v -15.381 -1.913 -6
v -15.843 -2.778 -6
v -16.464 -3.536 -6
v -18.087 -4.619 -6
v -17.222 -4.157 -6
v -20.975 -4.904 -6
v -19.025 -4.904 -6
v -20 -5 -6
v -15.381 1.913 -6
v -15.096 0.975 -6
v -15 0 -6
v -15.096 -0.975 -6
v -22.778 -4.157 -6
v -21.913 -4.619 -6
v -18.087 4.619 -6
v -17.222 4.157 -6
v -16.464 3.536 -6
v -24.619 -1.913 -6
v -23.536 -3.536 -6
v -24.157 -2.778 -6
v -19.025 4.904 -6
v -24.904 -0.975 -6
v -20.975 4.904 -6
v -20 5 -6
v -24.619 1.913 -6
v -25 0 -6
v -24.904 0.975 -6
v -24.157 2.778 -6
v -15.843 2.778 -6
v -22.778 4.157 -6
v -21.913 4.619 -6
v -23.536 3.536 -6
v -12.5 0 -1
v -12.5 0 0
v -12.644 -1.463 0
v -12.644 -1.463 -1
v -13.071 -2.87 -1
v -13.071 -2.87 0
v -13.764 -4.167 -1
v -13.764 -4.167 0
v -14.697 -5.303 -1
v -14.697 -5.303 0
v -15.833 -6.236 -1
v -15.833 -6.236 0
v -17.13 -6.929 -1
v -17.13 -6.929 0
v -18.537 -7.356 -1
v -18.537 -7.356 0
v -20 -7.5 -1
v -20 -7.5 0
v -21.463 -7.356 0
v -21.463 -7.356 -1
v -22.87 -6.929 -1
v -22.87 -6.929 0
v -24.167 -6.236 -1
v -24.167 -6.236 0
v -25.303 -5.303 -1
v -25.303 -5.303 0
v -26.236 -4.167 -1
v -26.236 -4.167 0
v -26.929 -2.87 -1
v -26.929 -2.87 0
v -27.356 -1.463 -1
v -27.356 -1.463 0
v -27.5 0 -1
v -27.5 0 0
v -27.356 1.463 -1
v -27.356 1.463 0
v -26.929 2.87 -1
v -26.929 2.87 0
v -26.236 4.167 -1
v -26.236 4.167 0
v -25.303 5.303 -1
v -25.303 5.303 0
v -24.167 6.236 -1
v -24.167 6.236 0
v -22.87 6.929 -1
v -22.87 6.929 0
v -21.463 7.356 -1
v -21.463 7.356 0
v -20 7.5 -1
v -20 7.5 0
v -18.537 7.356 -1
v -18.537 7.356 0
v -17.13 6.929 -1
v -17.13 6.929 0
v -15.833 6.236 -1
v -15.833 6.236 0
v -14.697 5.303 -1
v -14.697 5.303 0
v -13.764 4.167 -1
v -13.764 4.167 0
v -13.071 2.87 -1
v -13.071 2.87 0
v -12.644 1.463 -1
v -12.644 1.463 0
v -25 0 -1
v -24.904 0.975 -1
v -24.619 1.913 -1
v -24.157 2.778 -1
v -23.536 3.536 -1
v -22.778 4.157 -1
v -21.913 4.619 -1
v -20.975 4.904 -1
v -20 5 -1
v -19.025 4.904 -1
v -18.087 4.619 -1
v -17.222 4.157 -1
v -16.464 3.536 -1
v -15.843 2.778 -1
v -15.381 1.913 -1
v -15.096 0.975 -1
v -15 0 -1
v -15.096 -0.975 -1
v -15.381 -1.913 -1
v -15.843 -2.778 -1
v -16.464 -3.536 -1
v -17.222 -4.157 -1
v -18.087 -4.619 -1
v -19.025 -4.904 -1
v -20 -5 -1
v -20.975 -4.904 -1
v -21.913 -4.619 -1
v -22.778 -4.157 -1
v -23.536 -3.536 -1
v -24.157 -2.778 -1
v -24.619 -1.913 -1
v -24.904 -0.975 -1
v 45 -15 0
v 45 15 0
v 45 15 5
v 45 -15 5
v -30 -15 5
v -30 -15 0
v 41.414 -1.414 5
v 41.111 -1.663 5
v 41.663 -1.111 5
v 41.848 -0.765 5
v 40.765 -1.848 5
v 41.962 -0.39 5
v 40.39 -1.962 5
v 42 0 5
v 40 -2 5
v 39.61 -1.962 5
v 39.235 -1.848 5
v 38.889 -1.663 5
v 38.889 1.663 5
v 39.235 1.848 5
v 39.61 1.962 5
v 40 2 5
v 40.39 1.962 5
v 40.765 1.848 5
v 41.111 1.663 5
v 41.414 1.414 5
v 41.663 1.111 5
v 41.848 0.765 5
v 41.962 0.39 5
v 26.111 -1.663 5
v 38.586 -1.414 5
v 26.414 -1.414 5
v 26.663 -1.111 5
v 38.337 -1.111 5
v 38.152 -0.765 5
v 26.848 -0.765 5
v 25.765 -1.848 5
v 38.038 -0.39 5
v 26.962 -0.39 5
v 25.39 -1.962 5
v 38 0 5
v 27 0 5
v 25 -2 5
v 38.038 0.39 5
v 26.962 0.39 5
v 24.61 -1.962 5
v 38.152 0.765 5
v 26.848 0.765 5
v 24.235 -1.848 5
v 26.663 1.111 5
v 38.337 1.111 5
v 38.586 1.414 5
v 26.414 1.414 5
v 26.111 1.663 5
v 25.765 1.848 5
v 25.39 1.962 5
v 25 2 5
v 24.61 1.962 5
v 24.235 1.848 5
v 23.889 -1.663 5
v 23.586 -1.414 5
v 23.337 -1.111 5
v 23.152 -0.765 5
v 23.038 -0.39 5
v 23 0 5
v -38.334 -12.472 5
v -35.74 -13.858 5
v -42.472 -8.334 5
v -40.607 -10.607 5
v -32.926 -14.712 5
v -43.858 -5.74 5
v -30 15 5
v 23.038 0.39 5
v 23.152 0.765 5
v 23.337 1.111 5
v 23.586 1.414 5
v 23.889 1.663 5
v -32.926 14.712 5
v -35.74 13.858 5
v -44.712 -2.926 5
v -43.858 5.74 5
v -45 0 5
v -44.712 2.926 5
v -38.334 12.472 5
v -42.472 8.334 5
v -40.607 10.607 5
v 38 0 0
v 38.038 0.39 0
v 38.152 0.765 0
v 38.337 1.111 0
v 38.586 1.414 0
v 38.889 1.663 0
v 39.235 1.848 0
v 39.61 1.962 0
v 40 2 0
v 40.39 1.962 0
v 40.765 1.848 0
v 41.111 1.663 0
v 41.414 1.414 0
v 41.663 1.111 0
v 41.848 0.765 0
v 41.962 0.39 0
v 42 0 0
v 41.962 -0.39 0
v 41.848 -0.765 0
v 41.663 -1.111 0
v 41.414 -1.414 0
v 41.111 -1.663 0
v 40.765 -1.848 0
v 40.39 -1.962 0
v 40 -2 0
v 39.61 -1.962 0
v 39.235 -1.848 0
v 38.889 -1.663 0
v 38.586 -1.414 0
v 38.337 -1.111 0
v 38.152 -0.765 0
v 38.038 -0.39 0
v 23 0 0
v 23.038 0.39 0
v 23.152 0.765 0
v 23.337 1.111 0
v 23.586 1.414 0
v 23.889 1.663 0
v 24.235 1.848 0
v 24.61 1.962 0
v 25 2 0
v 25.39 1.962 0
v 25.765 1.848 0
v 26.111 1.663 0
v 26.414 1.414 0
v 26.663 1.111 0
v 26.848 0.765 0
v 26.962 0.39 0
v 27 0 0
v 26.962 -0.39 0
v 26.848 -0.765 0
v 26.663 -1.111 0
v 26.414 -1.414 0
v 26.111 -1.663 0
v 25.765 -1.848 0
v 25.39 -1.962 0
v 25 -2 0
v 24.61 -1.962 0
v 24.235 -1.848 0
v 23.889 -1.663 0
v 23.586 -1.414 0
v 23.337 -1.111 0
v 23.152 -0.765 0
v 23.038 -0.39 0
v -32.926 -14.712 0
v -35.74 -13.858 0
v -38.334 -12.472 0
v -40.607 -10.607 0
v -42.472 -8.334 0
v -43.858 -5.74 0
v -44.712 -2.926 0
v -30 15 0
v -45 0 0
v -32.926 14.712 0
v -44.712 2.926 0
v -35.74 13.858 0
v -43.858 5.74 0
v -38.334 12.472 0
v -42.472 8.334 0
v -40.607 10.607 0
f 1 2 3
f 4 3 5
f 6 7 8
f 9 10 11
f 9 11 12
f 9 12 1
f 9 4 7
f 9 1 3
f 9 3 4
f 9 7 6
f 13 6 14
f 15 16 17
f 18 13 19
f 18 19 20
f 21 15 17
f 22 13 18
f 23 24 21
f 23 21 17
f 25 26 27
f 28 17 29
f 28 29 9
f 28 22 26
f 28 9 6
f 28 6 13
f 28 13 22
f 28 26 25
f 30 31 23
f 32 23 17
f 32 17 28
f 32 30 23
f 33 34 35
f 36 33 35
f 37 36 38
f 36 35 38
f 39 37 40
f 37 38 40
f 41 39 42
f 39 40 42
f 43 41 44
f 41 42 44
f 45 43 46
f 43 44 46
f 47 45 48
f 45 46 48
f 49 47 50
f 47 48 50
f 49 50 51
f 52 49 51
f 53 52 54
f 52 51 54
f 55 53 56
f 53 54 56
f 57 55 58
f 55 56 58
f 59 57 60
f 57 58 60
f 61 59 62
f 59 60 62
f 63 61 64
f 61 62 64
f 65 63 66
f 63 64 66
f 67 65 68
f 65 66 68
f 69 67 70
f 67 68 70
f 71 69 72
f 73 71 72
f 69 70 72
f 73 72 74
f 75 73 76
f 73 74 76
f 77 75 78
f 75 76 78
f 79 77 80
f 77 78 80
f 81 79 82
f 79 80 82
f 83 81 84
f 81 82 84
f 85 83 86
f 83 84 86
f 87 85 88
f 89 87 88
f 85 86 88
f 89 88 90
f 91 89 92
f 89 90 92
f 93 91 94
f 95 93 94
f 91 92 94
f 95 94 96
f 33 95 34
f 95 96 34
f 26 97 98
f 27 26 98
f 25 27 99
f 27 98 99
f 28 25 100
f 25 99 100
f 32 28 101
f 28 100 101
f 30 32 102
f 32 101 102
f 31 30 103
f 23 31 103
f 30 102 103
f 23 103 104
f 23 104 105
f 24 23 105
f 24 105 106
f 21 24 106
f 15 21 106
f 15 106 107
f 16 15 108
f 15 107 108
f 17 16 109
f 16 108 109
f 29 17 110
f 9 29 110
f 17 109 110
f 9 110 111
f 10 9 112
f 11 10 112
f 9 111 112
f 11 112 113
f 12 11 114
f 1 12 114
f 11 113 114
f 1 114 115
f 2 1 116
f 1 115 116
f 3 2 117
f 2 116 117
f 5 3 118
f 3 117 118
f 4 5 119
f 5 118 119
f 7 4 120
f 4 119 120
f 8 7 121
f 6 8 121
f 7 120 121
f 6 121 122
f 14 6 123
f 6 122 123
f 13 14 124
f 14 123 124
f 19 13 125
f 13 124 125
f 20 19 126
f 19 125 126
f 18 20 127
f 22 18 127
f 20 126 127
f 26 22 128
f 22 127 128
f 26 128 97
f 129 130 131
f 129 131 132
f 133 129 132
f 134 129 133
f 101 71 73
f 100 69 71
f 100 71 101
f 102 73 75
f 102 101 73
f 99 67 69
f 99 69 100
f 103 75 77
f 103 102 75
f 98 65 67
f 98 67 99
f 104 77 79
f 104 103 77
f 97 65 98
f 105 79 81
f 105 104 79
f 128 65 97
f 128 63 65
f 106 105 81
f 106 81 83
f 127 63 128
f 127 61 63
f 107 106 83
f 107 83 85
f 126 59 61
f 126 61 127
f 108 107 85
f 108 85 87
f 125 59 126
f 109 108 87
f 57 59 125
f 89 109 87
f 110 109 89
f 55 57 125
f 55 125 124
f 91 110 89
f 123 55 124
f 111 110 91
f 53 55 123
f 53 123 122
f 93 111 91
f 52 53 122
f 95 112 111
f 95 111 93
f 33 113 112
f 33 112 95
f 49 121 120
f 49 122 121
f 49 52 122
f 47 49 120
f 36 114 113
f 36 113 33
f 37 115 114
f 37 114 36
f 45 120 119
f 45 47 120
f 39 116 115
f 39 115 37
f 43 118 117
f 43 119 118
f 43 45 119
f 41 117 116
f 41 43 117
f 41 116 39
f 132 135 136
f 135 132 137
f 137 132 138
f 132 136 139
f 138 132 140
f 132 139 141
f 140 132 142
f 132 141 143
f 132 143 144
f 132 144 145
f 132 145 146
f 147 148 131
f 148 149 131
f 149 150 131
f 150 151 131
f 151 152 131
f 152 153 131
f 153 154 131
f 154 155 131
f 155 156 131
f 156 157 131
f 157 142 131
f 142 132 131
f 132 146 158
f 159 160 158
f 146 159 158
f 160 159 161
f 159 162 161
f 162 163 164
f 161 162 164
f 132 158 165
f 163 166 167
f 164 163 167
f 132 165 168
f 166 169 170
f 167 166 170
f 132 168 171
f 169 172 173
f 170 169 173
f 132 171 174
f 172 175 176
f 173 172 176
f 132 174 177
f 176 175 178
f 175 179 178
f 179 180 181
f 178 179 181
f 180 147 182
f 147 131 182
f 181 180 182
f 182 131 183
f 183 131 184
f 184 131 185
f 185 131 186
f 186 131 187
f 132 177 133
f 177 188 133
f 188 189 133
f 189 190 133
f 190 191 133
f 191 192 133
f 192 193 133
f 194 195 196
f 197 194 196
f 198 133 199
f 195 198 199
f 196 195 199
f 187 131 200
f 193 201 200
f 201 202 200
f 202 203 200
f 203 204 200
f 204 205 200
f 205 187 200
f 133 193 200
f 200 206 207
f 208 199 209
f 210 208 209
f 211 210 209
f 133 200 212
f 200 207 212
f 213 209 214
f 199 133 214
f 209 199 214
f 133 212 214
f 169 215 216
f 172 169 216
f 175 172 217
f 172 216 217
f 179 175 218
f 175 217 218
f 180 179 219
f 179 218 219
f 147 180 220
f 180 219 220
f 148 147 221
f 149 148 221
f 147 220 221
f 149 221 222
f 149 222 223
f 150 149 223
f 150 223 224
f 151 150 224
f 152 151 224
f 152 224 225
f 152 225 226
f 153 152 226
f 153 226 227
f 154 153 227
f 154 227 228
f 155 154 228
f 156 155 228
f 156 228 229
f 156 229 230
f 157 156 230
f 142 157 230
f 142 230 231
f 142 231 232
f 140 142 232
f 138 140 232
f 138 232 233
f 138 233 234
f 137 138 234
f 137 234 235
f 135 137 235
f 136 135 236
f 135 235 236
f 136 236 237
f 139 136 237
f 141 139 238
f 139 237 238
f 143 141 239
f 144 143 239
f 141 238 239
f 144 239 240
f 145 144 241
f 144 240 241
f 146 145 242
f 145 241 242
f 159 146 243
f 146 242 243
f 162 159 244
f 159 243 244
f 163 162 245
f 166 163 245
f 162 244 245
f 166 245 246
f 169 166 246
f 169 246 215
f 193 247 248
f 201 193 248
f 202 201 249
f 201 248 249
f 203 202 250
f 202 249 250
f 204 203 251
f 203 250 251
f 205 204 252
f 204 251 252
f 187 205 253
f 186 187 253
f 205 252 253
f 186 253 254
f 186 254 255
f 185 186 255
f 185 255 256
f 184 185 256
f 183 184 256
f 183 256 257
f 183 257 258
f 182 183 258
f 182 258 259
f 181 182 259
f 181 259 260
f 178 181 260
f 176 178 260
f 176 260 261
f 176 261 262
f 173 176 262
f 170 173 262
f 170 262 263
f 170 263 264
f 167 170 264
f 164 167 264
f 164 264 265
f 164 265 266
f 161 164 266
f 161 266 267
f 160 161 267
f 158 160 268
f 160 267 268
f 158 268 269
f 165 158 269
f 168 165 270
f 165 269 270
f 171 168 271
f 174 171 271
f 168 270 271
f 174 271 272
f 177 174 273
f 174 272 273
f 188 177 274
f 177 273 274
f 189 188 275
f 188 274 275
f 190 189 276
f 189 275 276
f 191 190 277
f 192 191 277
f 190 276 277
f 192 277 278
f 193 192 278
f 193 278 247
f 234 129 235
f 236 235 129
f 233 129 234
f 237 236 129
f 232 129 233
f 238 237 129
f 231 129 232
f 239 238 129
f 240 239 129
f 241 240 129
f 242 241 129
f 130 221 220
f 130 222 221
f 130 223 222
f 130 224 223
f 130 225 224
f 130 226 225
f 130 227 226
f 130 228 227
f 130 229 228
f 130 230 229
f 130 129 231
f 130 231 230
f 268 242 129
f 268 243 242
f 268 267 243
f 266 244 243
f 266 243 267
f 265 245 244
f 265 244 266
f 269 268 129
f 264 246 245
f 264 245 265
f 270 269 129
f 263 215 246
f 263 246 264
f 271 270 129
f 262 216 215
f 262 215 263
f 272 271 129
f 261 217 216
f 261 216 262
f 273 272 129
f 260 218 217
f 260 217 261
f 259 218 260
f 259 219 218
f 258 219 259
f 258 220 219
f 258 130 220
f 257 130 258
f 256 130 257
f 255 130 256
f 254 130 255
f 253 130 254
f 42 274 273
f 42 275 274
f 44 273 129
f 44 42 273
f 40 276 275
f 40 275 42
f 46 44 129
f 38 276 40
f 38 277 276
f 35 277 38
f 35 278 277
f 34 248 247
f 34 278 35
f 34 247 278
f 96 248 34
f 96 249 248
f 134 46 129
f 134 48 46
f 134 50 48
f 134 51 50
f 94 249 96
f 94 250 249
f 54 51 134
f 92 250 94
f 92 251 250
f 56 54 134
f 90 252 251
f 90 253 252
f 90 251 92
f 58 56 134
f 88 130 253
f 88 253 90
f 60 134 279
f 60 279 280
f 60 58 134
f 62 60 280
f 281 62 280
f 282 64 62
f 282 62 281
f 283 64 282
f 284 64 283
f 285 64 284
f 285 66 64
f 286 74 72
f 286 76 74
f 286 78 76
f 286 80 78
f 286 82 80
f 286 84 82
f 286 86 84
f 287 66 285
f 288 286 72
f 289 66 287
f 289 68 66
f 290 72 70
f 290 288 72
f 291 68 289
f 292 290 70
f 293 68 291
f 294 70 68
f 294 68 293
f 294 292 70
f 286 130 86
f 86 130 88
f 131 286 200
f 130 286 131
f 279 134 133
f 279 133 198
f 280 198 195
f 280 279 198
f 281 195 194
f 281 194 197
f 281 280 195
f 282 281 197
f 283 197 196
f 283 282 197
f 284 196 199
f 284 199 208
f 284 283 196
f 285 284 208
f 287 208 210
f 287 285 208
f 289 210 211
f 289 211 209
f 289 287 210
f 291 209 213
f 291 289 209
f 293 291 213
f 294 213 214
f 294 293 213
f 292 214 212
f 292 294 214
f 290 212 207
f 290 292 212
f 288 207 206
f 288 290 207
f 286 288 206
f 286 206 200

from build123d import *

# Parameters (mm, degrees)
BOSS_EXTRUDE2_DEPTH = 5
SKETCH3_R           = 2
CUT_EXTRUDE1_DEPTH  = 48.696960071
SKETCH4_R           = 7.5
BOSS_EXTRUDE5_DEPTH = 1
SKETCH6_R           = 5
BOSS_EXTRUDE6_DEPTH = 5


with BuildPart() as part:
    # Sketch1 → Boss-Extrude2 (new body)
    with BuildSketch(Plane.XY):
        with BuildLine():
            Line((-30, 15), (45, 15))
            Line((45, 15), (45, -15))
            Line((45, -15), (-30, -15))
            ThreePointArc((-30, -15), (-45, 0), (-30, 15))
        make_face()
    extrude(amount=BOSS_EXTRUDE2_DEPTH)

    # Sketch3 → Cut-Extrude1 (cut, through all)
    with BuildSketch(Plane(origin=(0, 0, 0), x_dir=(-1, 0, 0), z_dir=(0, 0, -1))):
        with Locations((-40, 0)):
            Circle(SKETCH3_R)
        with Locations((-25, 0)):
            Circle(SKETCH3_R)
    extrude(amount=-CUT_EXTRUDE1_DEPTH, mode=Mode.SUBTRACT)

    # Sketch4 → Boss-Extrude5 (add)
    with BuildSketch(Plane(origin=(0, 0, 0), x_dir=(-1, 0, 0), z_dir=(0, 0, -1))):
        with Locations(Location((20, 0, 0), (0, 0, 180))):
            Circle(SKETCH4_R)
    extrude(amount=BOSS_EXTRUDE5_DEPTH)

    # Sketch6 → Boss-Extrude6 (add)
    with BuildSketch(Plane(origin=(0, 0, -1), x_dir=(-1, 0, 0), z_dir=(0, 0, -1))):
        with Locations((20, 0)):
            Circle(SKETCH6_R)
    extrude(amount=BOSS_EXTRUDE6_DEPTH)


solid = part.part
